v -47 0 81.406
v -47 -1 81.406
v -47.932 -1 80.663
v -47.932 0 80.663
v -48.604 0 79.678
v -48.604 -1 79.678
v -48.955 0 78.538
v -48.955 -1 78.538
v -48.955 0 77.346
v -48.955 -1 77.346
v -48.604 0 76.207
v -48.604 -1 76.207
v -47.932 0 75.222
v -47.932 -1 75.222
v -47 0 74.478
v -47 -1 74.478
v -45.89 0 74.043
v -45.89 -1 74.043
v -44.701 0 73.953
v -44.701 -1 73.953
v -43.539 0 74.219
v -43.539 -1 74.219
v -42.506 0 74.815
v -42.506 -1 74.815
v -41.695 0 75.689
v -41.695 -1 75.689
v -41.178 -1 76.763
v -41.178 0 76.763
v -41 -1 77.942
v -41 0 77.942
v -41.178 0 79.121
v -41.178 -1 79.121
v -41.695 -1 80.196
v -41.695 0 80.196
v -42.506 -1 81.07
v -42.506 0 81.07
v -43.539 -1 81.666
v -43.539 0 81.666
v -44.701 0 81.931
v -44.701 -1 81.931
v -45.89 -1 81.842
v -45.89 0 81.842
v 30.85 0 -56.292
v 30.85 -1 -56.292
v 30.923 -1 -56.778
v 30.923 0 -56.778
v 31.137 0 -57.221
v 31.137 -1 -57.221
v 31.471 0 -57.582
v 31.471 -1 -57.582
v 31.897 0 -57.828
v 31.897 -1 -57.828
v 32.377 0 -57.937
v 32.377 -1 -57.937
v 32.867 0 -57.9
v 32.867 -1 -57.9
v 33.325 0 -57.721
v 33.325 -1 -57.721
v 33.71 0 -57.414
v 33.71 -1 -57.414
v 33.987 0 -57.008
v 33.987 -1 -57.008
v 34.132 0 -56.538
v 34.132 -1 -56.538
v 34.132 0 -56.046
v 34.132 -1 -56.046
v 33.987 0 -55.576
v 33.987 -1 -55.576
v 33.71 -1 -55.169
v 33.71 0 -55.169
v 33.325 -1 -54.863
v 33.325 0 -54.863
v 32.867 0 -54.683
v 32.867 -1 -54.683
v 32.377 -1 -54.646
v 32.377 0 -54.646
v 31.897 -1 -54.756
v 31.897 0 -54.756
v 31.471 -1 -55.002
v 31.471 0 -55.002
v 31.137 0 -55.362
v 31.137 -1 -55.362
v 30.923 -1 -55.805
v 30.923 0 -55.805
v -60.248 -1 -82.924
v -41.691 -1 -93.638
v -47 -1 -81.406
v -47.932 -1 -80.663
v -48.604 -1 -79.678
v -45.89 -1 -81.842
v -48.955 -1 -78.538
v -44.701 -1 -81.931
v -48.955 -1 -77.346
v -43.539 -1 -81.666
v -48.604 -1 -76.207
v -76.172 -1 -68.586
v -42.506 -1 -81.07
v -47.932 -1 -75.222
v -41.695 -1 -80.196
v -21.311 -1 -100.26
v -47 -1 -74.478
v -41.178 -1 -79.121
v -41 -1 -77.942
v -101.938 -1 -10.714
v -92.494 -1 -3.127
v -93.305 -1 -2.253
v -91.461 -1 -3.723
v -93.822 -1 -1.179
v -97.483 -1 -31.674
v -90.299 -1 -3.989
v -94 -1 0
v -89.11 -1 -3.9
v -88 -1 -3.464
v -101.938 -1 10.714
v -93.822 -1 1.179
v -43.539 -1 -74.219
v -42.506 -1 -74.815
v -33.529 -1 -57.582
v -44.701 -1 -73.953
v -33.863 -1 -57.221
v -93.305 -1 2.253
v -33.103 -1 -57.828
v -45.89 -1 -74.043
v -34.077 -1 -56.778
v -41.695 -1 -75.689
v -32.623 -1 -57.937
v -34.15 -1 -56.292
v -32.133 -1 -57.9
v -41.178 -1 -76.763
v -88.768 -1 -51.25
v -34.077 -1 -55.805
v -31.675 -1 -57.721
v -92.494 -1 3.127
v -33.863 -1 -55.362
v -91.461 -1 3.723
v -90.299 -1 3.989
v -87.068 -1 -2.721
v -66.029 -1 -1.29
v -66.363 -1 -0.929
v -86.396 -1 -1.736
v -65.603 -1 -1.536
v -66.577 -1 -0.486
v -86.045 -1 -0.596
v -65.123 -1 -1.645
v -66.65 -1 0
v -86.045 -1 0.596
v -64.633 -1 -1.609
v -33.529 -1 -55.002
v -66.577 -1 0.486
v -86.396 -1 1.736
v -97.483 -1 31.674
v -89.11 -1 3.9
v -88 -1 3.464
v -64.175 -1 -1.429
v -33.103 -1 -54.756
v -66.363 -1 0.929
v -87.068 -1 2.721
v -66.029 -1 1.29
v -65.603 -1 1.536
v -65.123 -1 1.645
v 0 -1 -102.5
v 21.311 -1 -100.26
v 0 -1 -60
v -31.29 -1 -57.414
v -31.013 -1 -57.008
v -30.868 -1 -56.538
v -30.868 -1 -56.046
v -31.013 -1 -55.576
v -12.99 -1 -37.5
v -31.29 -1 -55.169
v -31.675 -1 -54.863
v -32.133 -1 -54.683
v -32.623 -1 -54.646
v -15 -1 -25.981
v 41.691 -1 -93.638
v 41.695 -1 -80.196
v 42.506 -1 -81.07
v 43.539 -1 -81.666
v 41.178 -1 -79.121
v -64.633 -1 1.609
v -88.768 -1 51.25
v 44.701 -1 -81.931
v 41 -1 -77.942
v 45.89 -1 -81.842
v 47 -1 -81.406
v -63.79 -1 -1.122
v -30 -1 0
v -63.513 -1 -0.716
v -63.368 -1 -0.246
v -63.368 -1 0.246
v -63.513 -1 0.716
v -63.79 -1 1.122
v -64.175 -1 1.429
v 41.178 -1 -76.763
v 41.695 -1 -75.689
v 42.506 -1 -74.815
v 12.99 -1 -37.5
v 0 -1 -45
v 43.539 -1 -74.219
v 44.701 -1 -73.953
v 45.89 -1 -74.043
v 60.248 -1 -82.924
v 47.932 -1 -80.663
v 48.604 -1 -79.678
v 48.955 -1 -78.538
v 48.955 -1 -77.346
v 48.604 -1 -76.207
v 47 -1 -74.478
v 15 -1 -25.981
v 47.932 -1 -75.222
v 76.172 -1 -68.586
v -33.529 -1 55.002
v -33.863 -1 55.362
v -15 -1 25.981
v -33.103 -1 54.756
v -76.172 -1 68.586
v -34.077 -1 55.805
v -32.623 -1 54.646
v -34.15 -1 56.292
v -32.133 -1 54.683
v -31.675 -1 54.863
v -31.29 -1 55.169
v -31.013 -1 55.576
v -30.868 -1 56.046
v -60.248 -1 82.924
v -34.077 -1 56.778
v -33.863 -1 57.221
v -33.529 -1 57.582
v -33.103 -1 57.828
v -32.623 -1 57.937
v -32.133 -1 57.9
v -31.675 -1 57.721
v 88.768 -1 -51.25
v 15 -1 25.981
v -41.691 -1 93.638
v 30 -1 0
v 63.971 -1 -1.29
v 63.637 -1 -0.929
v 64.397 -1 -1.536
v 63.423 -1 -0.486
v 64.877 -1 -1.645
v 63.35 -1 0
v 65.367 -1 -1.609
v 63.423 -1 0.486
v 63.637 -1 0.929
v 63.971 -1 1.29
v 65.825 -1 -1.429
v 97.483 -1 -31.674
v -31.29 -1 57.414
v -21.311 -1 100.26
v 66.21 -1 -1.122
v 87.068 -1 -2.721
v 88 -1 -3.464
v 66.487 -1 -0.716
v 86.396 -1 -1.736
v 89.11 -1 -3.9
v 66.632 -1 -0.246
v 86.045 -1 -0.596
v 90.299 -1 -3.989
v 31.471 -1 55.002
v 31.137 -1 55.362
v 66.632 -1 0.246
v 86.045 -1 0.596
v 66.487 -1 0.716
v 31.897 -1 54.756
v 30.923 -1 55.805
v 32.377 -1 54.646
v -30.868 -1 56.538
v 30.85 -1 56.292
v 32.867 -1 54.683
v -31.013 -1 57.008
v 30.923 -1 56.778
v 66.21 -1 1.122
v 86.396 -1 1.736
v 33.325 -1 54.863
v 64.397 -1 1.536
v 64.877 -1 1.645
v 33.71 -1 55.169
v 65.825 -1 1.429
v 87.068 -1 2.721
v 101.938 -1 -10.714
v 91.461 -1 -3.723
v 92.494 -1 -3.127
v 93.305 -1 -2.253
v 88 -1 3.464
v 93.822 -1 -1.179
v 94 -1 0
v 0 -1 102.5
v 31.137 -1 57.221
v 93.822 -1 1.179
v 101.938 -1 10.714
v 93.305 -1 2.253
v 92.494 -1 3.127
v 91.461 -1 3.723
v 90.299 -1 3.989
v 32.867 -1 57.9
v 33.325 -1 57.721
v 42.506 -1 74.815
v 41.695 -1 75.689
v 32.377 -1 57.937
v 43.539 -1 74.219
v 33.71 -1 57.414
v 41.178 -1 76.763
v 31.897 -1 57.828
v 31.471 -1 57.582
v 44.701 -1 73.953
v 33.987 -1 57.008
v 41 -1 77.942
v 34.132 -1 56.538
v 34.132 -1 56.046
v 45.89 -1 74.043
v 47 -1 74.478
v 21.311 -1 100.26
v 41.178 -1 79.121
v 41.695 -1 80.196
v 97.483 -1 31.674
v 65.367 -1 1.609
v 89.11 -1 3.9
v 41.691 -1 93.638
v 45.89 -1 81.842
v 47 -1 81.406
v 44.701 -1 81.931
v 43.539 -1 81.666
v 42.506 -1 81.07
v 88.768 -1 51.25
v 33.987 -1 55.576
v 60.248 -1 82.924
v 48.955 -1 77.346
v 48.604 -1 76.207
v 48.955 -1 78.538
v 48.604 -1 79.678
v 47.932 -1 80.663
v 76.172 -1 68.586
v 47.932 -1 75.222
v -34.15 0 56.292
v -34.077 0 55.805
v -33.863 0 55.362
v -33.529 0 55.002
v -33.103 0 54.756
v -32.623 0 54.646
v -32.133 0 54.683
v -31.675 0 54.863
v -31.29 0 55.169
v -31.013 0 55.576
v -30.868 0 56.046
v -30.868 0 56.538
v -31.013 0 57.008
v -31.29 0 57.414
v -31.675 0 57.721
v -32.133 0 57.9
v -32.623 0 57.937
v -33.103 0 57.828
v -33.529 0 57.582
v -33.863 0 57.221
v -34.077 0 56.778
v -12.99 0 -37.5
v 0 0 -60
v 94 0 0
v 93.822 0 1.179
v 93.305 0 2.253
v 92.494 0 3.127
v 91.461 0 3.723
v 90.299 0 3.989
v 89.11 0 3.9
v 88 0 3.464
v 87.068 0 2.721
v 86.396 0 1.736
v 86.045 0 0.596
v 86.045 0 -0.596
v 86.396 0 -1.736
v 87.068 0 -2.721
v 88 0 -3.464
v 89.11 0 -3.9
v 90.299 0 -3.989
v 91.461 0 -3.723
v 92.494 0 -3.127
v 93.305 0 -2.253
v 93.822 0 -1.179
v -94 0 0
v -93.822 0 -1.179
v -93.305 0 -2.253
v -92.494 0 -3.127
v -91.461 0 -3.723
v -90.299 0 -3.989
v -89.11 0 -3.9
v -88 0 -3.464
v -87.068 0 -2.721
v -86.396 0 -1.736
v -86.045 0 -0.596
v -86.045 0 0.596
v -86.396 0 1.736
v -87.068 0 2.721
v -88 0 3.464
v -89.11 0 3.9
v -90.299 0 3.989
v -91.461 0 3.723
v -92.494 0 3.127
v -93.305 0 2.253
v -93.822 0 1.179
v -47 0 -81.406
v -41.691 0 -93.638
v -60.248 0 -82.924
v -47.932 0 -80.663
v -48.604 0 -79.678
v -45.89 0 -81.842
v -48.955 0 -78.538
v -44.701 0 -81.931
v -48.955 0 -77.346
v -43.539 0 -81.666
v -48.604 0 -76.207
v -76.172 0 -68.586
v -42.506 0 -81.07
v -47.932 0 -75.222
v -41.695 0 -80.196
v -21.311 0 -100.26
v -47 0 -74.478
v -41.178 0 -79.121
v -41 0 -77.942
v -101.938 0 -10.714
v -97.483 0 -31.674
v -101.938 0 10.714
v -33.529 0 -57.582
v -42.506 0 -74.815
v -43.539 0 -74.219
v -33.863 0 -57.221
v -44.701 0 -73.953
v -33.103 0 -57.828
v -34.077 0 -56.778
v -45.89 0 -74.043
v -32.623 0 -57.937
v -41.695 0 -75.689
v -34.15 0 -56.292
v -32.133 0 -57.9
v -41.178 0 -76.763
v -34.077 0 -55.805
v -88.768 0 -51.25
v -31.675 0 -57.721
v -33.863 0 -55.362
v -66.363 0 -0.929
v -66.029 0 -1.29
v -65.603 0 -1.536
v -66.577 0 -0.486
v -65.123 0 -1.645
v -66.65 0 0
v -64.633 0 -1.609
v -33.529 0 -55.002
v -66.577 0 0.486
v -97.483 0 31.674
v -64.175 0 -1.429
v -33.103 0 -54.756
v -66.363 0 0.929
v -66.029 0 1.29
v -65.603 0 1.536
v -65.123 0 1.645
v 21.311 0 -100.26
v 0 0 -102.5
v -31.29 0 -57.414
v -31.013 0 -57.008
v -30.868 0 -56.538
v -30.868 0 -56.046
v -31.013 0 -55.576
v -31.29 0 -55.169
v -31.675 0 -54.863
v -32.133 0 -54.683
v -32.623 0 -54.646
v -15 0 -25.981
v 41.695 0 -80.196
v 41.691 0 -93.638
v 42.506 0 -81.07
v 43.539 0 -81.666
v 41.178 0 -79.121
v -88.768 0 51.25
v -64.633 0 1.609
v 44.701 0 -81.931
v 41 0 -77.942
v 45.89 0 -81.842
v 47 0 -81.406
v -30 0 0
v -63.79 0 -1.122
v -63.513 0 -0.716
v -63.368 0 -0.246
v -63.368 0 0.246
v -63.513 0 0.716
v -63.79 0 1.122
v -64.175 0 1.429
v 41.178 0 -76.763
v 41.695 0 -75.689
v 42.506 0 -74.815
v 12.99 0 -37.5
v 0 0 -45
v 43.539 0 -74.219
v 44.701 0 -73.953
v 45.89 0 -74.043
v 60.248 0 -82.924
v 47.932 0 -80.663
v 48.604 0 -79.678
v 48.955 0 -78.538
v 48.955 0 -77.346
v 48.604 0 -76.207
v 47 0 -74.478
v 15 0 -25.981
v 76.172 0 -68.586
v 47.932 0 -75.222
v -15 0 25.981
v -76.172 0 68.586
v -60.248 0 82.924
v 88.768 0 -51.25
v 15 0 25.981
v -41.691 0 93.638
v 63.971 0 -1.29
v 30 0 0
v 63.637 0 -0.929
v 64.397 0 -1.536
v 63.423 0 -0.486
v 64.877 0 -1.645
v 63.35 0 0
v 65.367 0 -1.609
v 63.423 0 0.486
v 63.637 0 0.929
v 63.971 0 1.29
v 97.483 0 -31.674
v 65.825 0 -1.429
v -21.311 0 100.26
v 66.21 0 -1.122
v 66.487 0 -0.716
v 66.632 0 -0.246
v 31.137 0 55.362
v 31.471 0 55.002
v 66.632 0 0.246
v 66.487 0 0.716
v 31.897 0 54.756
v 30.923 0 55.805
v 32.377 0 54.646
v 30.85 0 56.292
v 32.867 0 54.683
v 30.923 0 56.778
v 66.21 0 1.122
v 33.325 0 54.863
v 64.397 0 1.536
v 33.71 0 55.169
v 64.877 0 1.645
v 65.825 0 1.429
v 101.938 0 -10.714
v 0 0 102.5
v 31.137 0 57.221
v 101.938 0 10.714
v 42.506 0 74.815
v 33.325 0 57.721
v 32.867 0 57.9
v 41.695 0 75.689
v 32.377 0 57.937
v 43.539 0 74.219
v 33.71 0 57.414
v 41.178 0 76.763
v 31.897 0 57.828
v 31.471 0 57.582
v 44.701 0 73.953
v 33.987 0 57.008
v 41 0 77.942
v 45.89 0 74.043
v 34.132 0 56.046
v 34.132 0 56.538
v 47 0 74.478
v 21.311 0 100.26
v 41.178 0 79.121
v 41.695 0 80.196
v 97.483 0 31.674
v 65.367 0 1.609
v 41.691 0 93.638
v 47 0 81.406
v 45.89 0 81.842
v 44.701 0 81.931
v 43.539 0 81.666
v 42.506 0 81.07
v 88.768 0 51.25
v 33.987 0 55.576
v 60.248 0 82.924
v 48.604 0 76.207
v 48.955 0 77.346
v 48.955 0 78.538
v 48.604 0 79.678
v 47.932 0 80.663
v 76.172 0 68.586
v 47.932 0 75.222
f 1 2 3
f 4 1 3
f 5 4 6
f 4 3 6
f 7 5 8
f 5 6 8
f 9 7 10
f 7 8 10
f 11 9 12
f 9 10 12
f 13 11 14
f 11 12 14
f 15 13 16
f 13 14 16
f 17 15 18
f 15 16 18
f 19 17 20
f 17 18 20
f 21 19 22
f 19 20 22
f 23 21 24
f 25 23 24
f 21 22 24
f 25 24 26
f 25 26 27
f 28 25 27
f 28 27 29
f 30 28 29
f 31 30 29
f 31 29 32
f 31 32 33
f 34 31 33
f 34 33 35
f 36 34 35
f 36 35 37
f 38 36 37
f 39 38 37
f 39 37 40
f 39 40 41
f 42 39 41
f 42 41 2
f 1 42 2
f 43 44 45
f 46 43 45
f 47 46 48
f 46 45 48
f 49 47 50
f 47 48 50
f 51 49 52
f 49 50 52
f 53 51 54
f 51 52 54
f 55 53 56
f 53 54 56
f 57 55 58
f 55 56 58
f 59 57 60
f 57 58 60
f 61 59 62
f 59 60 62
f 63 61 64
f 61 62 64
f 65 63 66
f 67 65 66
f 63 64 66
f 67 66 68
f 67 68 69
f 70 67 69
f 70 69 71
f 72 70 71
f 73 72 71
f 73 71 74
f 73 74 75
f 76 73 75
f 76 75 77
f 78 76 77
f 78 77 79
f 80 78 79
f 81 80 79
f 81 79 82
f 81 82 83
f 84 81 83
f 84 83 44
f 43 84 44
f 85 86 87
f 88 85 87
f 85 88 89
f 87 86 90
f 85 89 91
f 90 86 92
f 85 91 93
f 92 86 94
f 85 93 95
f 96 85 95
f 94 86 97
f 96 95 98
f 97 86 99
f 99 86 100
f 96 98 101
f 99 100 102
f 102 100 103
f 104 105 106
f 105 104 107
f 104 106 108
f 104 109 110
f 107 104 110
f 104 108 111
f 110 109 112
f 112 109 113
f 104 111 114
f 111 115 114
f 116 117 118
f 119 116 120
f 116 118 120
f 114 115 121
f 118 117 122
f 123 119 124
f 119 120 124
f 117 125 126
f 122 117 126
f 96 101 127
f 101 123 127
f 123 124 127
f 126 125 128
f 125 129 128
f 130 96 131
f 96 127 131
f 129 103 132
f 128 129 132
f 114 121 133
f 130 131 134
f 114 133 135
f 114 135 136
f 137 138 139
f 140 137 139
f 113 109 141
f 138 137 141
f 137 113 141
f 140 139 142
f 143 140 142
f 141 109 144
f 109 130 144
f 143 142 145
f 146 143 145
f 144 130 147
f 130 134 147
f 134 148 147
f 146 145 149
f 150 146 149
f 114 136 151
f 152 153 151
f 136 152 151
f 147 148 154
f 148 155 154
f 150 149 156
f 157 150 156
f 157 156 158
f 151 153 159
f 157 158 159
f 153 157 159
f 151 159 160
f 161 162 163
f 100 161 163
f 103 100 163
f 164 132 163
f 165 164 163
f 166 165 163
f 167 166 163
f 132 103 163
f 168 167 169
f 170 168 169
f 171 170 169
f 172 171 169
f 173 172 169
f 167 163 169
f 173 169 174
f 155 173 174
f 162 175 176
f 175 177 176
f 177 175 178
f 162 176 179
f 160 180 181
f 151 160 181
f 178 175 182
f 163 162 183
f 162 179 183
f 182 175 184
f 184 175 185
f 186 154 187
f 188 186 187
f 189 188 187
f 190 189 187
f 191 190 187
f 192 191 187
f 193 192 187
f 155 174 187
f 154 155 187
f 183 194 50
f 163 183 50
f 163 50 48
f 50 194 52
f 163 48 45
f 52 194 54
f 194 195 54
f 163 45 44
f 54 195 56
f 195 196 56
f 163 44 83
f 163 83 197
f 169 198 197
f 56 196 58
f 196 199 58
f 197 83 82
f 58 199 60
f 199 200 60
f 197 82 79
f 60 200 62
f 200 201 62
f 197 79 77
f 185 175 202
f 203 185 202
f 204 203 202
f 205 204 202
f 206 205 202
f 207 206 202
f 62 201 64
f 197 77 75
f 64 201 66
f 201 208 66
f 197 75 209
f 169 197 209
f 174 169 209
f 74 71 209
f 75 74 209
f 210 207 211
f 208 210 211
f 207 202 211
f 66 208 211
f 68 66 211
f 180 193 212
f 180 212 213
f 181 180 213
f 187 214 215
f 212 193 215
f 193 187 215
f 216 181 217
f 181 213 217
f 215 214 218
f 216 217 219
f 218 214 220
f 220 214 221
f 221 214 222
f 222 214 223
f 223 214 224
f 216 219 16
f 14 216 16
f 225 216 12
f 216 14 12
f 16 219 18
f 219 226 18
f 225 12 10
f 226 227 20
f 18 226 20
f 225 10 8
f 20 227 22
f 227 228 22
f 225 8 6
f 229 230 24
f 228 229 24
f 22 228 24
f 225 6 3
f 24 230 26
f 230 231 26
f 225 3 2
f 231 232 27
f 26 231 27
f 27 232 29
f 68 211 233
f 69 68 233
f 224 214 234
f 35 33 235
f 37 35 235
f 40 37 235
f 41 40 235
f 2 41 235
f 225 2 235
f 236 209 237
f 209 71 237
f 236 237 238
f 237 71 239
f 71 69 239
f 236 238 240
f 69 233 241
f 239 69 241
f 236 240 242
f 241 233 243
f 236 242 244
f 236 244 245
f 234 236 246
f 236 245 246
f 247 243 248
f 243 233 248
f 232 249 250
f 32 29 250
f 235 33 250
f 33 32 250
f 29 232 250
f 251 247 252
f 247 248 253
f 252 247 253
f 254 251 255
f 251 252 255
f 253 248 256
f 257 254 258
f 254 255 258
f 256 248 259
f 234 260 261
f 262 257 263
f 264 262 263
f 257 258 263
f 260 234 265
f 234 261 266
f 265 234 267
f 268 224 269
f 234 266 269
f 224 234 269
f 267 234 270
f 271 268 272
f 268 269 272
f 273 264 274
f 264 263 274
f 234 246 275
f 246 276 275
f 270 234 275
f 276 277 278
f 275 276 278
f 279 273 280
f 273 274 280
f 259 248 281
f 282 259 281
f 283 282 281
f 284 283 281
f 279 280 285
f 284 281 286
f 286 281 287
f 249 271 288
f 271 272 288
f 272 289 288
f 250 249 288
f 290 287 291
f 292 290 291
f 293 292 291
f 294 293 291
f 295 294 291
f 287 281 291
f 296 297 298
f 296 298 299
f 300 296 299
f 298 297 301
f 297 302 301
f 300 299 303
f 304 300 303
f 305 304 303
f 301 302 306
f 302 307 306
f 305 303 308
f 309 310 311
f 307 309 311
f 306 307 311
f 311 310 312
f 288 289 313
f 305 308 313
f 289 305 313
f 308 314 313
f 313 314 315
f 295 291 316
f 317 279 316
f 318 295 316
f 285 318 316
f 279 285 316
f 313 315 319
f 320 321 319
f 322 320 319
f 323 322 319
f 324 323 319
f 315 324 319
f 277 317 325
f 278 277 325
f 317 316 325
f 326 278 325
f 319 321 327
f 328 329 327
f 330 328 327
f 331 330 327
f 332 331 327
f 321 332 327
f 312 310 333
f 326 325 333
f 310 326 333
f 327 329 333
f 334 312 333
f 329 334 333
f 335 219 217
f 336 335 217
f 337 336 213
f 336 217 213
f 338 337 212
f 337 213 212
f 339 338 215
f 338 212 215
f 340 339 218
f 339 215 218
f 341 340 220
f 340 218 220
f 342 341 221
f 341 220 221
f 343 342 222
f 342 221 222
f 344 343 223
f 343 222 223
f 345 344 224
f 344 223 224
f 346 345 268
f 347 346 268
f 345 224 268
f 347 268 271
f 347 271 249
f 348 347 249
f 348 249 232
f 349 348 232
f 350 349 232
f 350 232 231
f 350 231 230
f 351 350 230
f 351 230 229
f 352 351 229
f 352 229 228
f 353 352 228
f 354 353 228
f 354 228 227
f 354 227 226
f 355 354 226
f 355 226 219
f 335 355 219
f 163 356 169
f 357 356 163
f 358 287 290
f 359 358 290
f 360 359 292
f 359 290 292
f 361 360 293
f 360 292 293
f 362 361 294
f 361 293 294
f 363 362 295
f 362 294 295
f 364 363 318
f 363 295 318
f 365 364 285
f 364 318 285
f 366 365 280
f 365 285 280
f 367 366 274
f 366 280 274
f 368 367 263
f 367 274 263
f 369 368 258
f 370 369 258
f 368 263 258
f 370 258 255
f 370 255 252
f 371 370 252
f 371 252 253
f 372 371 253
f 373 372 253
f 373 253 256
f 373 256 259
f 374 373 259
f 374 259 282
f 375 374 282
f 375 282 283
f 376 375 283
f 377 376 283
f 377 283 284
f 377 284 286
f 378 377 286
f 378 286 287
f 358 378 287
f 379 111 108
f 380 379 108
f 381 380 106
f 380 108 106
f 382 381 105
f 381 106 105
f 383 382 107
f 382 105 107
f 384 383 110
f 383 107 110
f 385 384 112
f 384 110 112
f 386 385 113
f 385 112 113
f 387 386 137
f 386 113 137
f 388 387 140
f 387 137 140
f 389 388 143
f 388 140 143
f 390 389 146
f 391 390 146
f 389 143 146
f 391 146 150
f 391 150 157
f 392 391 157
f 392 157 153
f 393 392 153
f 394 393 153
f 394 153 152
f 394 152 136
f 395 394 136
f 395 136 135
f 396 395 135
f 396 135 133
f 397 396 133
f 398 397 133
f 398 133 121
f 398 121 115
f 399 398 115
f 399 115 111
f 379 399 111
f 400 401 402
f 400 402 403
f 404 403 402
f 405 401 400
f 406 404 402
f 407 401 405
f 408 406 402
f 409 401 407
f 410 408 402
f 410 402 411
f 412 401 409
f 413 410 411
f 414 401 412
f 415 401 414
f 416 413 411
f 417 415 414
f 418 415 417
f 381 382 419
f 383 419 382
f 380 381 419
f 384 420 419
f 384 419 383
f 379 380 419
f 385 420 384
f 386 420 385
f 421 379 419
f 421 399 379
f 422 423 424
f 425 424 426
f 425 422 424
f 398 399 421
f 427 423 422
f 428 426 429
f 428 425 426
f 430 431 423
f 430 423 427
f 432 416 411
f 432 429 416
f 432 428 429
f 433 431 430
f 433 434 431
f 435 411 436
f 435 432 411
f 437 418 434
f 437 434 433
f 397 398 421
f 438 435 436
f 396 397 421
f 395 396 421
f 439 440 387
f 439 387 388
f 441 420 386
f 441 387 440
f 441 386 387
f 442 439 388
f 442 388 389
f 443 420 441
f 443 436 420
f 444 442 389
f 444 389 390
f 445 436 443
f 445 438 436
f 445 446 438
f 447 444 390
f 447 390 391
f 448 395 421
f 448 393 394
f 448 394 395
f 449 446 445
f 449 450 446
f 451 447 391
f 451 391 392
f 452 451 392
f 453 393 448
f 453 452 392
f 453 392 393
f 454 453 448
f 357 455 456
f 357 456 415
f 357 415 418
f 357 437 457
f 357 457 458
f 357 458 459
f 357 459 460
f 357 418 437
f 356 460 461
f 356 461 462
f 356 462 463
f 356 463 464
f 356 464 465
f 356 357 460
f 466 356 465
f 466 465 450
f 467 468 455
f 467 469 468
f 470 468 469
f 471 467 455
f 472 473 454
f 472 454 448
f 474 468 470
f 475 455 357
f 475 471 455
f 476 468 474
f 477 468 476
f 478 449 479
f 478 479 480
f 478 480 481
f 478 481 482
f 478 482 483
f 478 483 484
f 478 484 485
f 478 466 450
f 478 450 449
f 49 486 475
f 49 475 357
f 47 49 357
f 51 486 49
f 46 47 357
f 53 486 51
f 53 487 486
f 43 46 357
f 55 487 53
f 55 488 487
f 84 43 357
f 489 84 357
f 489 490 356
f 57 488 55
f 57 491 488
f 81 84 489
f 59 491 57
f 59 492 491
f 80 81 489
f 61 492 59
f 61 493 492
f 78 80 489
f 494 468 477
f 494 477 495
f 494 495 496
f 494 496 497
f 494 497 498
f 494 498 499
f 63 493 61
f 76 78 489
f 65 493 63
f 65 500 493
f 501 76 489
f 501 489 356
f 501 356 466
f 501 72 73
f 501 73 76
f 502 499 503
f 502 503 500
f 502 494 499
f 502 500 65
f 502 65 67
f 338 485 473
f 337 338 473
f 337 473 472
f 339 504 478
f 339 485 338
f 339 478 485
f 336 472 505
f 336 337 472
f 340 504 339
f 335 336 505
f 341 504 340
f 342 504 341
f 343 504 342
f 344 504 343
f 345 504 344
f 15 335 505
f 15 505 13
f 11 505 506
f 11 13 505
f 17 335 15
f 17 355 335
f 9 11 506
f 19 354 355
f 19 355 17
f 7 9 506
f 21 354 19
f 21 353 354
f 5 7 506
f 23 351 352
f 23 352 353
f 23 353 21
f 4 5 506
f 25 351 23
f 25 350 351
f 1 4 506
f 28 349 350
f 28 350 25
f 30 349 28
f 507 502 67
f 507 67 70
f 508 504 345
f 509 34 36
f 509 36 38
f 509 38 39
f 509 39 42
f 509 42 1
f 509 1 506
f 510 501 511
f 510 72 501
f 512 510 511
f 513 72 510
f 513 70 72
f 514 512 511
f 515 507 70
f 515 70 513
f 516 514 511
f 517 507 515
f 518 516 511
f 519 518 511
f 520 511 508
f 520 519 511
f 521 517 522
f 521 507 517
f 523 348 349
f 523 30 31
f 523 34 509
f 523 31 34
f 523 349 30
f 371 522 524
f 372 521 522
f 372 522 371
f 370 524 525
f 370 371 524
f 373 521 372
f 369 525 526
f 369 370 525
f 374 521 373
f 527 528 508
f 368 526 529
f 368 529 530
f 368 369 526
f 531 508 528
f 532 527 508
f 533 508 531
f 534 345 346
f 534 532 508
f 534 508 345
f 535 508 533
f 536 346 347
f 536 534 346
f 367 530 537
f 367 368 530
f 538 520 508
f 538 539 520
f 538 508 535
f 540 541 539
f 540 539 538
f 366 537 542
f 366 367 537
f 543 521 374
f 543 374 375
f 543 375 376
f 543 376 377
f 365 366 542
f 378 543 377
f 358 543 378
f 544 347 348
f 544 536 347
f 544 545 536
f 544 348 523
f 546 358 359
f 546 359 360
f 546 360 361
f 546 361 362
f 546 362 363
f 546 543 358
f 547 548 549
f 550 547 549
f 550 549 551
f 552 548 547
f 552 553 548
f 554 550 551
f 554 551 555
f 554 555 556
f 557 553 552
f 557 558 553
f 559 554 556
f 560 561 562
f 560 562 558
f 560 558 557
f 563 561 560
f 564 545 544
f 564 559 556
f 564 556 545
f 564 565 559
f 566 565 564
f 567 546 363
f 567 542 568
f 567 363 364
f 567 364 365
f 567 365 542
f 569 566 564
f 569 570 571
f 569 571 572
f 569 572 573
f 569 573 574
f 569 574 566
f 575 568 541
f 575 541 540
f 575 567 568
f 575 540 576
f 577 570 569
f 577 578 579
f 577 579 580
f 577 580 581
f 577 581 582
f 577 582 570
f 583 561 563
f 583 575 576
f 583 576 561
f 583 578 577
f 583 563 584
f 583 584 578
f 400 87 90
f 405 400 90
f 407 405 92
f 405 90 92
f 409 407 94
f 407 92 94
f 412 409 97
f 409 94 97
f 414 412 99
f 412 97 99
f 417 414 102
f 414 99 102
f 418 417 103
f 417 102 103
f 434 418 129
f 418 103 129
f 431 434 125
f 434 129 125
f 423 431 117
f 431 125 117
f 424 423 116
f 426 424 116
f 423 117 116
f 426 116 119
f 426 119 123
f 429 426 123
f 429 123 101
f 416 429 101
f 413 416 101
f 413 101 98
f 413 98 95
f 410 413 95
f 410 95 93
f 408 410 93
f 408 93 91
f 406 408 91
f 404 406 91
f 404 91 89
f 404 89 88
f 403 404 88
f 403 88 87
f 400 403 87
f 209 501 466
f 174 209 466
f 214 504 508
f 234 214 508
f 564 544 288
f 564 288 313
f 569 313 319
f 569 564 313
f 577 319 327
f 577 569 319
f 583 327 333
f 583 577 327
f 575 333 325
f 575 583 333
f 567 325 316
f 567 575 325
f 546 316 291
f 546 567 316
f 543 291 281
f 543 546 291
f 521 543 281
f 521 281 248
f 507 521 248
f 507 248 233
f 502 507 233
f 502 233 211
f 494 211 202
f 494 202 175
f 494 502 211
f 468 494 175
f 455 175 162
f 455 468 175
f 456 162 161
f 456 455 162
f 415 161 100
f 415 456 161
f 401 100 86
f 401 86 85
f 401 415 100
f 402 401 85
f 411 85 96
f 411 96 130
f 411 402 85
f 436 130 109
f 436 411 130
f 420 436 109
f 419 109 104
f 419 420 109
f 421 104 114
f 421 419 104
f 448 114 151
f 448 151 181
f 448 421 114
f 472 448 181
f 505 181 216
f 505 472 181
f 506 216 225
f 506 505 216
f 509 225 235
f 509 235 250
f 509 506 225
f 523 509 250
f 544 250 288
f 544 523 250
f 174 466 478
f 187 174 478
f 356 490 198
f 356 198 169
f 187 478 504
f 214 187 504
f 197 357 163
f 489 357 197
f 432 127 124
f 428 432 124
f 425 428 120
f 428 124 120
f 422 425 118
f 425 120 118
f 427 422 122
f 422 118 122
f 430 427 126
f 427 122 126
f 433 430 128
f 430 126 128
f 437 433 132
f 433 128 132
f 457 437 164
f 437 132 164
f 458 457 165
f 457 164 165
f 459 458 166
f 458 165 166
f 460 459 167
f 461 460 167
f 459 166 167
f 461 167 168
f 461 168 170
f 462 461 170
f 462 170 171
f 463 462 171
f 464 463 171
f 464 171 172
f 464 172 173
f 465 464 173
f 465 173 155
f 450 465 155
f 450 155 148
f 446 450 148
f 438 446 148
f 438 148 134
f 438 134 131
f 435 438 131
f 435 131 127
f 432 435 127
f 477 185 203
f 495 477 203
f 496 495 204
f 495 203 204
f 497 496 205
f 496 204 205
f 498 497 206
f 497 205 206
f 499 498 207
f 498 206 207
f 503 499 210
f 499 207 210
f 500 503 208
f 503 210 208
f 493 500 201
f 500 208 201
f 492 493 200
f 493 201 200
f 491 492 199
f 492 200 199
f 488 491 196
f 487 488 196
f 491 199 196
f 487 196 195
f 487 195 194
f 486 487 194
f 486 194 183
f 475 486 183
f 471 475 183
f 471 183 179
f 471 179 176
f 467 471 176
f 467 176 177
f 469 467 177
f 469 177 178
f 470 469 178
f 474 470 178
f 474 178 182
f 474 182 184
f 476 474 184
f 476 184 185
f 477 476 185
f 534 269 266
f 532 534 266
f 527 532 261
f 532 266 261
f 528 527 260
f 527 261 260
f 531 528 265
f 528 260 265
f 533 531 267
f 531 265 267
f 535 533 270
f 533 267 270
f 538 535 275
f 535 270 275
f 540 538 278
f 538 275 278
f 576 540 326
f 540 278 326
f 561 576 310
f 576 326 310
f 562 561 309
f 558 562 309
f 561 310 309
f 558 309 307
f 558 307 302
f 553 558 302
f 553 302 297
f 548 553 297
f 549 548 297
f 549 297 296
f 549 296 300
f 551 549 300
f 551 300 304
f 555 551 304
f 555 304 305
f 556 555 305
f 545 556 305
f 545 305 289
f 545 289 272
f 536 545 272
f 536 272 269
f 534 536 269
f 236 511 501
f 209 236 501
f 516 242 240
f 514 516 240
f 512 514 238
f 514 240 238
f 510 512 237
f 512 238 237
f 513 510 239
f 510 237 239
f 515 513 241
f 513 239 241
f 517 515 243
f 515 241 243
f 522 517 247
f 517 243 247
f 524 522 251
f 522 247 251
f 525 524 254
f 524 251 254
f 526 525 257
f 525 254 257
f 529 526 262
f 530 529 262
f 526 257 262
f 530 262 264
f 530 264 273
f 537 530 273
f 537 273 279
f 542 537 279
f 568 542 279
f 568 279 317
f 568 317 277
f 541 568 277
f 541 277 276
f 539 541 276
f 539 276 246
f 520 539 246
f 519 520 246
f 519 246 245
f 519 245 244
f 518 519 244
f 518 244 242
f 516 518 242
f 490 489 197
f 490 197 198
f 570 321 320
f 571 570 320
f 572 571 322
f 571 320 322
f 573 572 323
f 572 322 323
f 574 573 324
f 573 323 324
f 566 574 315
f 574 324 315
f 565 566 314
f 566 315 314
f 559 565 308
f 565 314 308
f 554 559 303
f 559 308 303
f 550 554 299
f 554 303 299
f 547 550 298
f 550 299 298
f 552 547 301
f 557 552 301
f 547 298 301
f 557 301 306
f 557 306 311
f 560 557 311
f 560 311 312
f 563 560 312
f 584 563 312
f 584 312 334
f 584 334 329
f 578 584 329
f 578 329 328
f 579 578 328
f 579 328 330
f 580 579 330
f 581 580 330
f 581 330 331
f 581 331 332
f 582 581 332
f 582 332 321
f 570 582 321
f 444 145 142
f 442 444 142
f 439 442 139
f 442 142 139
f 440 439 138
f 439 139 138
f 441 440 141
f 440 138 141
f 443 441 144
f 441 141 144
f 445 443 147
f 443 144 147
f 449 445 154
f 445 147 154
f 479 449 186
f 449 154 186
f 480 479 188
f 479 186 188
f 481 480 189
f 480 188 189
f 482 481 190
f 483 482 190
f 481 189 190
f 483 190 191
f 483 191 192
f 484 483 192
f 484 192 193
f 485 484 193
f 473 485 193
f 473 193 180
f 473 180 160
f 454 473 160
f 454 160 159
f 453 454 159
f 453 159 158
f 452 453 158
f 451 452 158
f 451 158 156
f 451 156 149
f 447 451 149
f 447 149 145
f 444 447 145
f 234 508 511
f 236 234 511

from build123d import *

# Parameters (mm, degrees)
SKETCH_1_R               = 102.5
SM_BASE_FLANGE_1_DEPTH   = 1
HOLE_WIZARD_8_0_8_1_D    = 8
PATTERN_CIRCULAR_1_COUNT = 6
HOLE_WIZARD_3_3_3_3_1_D  = 3.3


# Sheet-metal steps are written as plain solids
with BuildPart() as part:
    # Sketch 1 → 基体-法兰1 (new body)
    with BuildSketch(Plane(origin=(0, 0, 0), x_dir=(1, 0, 0), z_dir=(0, 1, 0))):
        with Locations(Location((0, 0, 0), (0, 0, 270))):
            Circle(SKETCH_1_R)
        Polygon((-12.990381057, 37.5), (0, 60), (12.990381057, 37.5), (0, 45), align=None, mode=Mode.SUBTRACT)
        Polygon((30, 0), (15, 25.980762114), (-15, 25.980762114), (-30, 0), (-15, -25.980762114), (15, -25.980762114), align=None, mode=Mode.SUBTRACT)
    extrude(amount=-SM_BASE_FLANGE_1_DEPTH)

    # Ø8.0 (8) 直径孔1 (through all)
    with Locations(Plane(origin=(0, 0, 0), x_dir=(1, 0, 0), z_dir=(0, 1, 0))):
        with Locations((-90, 0)):
            hole_wizard_8_0_8_1 = Hole(HOLE_WIZARD_8_0_8_1_D / 2)

    # 阵列(圆周)1: Ø8.0 (8) 直径孔1 ×6 about axis
    pattern_circular_1_axis = Axis((0, 0, 0), (0, 1, 0))
    for i in range(1, PATTERN_CIRCULAR_1_COUNT):
        add(hole_wizard_8_0_8_1.rotate(pattern_circular_1_axis, i * 360 / PATTERN_CIRCULAR_1_COUNT), mode=Mode.SUBTRACT)

    # Ø3.3 (3.3) 直径孔1 (through all)
    with Locations(Plane(origin=(0, 0, 0), x_dir=(1, 0, 0), z_dir=(0, 1, 0))):
        with Locations((32.5, -56.291651246), (65, 0), (32.5, 56.291651246), (-32.5, 56.291651246), (-65, 0), (-32.5, -56.291651246)):
            Hole(HOLE_WIZARD_3_3_3_3_1_D / 2)


solid = part.part
